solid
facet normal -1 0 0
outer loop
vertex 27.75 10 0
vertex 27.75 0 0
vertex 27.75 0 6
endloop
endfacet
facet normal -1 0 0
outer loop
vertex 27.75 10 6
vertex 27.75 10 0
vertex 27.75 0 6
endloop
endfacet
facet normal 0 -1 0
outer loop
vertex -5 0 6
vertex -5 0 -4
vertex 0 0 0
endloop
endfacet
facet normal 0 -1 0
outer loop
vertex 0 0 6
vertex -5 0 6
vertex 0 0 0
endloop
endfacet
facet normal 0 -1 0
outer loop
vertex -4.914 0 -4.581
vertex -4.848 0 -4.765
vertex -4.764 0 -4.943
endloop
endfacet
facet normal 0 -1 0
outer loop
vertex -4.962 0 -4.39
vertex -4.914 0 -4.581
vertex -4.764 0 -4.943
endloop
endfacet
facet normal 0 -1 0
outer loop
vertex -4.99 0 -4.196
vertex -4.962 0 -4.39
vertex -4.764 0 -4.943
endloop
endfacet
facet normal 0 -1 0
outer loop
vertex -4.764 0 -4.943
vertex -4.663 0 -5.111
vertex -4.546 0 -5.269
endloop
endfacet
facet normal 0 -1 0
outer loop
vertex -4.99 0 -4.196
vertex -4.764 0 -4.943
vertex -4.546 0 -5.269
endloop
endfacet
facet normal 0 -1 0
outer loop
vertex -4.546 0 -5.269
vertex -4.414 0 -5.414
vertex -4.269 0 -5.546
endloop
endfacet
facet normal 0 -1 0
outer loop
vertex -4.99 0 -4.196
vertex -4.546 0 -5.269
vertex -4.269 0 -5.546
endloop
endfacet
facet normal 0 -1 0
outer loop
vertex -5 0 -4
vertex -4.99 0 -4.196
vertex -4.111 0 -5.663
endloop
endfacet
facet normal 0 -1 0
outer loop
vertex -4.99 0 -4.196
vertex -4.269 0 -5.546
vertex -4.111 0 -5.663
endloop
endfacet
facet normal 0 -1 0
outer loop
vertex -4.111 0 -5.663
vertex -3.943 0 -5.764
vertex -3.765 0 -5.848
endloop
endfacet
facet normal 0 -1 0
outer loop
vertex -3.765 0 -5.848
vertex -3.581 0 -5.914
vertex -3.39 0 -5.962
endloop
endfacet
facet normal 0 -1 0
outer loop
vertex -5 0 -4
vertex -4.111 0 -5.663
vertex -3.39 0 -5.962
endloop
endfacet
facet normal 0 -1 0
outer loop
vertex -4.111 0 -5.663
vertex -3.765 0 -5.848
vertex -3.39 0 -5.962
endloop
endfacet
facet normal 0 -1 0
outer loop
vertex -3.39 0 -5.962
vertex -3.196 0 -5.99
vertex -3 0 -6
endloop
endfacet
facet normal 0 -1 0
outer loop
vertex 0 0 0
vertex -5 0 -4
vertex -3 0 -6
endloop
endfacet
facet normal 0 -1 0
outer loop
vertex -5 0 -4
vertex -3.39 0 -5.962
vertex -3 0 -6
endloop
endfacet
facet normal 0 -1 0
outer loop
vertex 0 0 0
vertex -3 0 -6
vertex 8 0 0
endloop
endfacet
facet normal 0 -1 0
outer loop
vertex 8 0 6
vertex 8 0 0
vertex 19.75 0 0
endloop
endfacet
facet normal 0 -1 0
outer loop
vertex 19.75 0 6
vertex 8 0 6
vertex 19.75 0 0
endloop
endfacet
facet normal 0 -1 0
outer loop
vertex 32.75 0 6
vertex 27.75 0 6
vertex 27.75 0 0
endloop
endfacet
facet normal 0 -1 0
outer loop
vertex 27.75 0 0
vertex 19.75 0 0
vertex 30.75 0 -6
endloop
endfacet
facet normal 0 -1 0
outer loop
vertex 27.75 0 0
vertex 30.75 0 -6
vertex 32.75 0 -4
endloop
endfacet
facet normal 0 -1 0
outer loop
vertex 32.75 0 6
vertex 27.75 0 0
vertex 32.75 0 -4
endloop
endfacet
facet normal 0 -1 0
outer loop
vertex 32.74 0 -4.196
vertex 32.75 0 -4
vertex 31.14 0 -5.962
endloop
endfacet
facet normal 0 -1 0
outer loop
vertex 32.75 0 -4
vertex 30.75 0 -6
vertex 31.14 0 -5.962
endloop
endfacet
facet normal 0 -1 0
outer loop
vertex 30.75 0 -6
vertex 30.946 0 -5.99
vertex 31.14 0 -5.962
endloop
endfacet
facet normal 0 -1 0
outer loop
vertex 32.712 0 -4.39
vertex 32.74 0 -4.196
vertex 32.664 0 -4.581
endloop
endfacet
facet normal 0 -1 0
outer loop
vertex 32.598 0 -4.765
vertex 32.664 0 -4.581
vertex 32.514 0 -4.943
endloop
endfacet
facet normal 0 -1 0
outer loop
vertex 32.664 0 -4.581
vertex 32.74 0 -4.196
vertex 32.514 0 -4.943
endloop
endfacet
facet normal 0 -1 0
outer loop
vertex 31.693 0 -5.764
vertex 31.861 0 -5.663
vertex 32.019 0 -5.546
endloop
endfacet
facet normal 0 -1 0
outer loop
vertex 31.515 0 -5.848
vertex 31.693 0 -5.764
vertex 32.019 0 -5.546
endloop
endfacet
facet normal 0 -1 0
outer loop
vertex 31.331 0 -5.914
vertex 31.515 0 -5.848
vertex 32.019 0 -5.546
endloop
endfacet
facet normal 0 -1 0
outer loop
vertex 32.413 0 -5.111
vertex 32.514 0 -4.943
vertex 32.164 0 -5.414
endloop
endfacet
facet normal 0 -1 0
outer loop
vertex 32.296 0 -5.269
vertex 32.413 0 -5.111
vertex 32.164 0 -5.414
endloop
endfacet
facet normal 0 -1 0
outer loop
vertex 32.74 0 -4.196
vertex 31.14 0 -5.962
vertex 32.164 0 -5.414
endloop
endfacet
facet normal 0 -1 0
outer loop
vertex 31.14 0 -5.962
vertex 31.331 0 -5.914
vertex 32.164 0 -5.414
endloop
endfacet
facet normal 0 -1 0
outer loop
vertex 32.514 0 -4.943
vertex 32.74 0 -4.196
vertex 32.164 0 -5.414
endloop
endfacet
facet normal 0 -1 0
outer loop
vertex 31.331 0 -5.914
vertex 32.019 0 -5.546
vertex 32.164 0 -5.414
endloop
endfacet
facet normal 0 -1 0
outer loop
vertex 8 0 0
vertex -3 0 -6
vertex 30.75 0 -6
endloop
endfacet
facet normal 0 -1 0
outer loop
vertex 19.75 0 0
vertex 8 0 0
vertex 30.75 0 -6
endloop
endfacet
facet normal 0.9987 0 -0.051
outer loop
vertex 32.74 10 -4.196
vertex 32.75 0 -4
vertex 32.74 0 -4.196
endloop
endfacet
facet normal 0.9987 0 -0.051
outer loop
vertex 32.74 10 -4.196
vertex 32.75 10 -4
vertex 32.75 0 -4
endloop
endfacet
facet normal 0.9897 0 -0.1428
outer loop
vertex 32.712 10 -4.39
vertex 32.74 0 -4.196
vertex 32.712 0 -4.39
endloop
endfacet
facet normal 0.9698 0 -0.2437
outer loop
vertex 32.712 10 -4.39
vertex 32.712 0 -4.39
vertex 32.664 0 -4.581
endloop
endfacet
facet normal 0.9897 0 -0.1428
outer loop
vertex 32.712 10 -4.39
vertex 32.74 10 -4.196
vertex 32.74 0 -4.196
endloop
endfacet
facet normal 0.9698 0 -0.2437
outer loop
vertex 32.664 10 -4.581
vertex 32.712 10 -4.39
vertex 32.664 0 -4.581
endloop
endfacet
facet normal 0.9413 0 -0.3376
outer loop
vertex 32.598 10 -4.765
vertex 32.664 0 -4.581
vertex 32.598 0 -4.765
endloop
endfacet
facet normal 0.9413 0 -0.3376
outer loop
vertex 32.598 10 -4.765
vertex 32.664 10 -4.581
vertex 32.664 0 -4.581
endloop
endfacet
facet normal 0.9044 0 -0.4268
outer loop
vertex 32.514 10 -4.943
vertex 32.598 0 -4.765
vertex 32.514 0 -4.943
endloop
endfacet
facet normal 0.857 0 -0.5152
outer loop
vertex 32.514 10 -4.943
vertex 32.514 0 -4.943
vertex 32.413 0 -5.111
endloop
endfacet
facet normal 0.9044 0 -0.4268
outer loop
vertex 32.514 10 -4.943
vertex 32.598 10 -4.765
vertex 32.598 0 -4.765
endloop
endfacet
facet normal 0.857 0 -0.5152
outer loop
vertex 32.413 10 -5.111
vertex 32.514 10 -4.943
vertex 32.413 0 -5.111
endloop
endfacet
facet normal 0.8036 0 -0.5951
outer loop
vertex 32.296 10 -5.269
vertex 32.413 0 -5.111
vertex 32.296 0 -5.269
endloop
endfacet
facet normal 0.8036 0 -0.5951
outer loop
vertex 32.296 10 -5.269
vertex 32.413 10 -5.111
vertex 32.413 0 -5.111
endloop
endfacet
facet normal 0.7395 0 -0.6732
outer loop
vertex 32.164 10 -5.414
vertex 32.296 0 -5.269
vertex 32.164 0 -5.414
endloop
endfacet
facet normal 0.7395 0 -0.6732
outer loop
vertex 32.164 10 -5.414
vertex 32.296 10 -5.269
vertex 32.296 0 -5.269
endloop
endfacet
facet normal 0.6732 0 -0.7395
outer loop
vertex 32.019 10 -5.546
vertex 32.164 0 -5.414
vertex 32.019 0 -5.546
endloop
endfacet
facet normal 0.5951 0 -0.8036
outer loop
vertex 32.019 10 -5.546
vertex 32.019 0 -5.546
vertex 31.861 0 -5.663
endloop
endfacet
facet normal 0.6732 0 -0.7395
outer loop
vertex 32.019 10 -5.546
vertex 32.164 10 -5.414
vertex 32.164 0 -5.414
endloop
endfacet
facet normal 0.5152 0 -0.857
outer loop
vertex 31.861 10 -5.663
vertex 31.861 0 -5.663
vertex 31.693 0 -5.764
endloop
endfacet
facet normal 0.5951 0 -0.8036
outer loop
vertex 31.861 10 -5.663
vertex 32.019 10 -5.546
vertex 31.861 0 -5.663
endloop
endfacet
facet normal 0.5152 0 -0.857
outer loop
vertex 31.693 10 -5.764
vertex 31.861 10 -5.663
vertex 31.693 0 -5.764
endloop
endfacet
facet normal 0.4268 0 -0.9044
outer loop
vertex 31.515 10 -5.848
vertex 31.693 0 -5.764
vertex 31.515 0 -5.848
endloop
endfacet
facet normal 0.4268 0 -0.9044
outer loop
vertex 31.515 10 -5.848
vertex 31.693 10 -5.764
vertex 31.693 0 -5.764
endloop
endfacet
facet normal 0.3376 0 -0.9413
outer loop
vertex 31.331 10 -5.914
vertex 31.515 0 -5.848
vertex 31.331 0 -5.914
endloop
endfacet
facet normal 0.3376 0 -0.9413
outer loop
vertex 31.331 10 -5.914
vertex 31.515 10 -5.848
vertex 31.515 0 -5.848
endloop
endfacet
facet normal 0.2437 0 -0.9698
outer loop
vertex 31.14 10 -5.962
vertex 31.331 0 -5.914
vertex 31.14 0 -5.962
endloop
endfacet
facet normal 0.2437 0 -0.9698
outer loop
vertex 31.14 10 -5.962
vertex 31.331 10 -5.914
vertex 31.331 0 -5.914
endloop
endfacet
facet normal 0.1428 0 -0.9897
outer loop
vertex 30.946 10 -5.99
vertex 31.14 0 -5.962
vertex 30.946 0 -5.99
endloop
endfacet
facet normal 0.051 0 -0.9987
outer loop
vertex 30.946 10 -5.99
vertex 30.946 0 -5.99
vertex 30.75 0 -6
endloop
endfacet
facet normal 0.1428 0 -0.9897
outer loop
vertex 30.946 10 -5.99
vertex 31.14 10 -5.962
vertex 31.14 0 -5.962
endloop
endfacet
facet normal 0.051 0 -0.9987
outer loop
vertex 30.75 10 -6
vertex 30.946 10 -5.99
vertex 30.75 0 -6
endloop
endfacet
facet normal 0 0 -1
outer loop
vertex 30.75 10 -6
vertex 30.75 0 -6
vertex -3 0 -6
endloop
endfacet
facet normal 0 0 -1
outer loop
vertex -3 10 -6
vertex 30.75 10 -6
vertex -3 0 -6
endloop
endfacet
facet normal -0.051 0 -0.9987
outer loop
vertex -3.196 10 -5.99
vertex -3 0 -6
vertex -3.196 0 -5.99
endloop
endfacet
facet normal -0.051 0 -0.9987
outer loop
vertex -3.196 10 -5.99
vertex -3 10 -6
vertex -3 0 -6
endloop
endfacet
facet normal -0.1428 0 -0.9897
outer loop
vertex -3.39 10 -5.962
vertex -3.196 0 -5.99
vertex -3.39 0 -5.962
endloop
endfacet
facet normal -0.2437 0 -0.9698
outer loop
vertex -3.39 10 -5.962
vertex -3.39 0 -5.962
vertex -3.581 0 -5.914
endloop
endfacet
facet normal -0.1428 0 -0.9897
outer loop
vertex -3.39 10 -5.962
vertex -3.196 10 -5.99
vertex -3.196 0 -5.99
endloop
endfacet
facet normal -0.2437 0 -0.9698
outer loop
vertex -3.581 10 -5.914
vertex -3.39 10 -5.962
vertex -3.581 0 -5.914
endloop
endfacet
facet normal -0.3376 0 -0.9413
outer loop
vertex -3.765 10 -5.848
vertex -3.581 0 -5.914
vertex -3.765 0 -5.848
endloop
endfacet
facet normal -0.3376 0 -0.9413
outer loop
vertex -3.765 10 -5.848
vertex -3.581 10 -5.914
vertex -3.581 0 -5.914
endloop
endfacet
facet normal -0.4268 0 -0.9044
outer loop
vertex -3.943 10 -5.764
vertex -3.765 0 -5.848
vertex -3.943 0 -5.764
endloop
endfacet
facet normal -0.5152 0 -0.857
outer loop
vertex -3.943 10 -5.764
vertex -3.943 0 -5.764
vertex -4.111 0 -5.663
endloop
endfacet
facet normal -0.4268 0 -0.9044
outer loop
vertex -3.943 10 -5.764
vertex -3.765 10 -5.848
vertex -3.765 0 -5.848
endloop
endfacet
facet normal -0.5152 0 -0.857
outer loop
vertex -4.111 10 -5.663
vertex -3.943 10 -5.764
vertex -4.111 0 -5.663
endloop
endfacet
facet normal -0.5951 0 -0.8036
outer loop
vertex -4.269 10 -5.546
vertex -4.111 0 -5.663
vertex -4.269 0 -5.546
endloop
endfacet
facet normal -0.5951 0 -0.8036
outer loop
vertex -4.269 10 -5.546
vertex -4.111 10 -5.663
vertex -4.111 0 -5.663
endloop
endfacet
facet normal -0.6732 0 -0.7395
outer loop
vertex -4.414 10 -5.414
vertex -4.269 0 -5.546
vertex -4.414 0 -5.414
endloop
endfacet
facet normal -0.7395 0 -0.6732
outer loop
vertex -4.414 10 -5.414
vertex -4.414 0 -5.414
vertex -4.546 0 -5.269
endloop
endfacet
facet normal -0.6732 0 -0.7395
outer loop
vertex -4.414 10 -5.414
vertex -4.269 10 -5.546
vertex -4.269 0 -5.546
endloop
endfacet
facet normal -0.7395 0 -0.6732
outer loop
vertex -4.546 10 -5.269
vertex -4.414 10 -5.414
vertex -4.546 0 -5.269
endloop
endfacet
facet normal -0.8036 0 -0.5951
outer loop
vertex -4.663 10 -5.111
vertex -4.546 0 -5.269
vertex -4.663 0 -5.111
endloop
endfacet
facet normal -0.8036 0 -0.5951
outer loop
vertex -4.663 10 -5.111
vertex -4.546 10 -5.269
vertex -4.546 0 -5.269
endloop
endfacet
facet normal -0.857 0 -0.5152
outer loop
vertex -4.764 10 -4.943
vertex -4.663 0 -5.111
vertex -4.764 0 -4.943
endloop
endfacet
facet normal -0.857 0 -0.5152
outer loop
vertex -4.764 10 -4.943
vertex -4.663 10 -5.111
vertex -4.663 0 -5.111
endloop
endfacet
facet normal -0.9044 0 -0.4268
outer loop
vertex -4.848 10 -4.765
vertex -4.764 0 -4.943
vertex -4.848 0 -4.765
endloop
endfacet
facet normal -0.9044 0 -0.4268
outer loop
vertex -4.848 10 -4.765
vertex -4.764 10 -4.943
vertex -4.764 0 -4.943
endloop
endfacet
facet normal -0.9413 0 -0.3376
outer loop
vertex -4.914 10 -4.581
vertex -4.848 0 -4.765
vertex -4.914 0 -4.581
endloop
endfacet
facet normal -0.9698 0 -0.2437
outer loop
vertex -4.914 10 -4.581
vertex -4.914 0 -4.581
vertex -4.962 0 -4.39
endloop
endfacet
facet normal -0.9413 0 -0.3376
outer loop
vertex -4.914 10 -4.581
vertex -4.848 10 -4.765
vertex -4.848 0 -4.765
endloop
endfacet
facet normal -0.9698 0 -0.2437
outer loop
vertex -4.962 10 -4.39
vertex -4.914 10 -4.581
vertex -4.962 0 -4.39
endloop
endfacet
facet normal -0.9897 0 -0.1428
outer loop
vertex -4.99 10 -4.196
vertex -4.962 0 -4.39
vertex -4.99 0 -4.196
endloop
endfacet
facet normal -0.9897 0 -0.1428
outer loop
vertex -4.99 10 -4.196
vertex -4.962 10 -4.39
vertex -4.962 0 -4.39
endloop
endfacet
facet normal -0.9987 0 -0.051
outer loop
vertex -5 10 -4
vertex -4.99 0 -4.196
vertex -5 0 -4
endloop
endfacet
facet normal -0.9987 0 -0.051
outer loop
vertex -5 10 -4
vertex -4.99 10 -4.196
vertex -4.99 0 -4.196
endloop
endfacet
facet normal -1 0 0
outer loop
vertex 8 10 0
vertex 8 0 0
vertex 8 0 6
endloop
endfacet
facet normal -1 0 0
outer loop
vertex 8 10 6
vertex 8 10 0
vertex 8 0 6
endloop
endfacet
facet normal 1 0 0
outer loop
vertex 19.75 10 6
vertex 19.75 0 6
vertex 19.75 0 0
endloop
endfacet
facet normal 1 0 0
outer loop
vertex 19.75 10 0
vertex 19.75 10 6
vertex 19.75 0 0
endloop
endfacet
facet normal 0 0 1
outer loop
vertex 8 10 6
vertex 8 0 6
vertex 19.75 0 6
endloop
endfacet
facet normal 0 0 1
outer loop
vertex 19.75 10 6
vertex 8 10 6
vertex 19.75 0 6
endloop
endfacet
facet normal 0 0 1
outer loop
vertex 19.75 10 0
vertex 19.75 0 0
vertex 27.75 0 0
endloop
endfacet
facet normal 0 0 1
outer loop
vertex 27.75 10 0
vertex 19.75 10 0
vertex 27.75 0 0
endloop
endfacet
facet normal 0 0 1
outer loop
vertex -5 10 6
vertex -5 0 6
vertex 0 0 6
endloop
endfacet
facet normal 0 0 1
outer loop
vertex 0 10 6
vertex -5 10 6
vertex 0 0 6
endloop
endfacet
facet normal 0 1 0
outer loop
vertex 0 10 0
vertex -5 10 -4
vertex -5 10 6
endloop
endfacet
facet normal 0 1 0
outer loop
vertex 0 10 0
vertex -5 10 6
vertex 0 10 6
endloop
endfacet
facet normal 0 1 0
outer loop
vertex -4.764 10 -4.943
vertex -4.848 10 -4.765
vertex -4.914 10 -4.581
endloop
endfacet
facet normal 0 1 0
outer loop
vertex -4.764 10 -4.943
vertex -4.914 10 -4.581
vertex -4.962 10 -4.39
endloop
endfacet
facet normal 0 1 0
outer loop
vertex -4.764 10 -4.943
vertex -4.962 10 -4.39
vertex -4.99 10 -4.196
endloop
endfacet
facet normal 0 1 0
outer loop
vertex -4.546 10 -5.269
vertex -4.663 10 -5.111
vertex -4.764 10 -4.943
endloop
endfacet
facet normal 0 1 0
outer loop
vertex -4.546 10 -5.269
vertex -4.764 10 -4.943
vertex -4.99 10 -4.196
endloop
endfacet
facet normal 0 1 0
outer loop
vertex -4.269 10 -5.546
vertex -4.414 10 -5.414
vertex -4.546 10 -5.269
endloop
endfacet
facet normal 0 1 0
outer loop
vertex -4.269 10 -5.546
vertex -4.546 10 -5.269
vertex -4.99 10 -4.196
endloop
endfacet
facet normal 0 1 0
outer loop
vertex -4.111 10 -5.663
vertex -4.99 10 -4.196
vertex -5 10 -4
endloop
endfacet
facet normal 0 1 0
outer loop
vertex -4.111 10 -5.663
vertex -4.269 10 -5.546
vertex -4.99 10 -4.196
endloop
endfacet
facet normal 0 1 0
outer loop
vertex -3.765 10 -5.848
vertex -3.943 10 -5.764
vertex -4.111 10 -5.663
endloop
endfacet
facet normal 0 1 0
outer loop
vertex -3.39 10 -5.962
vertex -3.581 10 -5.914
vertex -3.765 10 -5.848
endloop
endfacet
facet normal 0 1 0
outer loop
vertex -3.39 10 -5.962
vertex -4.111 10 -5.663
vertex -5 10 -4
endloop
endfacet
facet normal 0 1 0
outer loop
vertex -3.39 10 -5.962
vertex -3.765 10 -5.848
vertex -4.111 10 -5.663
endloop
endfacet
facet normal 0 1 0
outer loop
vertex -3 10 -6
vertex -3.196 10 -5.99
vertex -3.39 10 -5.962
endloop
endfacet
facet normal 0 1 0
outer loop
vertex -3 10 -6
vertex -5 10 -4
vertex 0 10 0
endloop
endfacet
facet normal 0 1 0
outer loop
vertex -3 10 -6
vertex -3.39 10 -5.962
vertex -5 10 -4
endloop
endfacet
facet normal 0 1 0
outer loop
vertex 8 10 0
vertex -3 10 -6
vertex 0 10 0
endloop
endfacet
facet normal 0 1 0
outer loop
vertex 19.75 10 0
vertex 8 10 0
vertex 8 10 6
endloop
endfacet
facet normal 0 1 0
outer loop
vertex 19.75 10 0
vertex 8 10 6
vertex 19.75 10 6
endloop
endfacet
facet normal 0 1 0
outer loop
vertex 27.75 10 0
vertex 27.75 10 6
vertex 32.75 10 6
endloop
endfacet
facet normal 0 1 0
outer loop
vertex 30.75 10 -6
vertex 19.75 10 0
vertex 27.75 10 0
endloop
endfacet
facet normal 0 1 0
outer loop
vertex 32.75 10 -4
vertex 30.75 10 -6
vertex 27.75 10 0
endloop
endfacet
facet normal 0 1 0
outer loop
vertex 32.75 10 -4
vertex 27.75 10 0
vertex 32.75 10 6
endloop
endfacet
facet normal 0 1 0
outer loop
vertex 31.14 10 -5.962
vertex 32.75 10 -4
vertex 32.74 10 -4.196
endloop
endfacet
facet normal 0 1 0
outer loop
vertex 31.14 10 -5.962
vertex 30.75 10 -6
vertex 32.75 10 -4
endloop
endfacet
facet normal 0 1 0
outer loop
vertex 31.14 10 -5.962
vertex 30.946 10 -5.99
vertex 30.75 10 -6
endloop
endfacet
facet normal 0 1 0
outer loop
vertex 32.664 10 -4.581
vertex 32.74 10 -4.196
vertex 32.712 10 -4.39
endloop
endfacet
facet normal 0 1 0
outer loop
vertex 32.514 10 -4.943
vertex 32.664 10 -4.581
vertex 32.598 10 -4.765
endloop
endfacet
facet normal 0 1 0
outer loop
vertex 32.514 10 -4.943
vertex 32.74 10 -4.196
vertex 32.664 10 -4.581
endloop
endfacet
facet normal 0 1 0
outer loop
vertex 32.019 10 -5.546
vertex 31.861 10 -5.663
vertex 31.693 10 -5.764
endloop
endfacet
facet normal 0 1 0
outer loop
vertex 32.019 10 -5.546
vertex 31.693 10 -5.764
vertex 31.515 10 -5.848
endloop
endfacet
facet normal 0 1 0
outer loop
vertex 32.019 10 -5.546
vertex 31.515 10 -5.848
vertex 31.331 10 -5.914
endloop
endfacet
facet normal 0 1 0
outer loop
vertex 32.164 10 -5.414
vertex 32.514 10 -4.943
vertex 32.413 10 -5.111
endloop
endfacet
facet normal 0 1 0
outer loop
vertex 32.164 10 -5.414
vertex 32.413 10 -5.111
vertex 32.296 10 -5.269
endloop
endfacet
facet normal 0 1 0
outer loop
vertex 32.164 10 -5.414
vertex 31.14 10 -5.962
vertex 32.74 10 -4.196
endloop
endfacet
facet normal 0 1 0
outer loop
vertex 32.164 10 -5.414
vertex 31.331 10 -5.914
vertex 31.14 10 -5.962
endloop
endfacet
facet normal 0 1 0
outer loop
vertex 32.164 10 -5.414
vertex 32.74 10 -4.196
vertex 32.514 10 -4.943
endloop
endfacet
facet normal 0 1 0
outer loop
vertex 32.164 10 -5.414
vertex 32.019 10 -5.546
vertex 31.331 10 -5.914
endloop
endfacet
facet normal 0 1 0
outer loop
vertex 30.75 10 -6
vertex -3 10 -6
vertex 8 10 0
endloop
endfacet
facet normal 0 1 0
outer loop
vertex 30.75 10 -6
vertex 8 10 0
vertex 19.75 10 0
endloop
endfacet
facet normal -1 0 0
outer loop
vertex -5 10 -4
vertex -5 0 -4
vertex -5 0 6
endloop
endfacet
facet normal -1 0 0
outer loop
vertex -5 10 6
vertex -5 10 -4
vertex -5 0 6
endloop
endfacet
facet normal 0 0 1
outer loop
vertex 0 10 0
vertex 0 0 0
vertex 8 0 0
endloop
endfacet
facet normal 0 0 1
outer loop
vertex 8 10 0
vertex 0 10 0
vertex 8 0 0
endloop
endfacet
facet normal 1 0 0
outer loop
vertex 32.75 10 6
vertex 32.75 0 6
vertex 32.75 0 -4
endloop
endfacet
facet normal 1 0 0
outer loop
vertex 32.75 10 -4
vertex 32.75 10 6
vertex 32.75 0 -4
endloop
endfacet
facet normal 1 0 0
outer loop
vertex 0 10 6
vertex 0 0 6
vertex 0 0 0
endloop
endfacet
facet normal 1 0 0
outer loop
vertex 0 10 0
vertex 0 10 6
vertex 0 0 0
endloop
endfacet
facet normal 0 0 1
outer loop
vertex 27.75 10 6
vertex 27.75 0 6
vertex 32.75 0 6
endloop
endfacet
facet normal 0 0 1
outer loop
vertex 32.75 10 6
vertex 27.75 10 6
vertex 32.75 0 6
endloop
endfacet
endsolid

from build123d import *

# Parameters (mm, degrees)
BOSS_EXTRUDE1_DEPTH = 10
FILLET1_R           = 2


with BuildPart() as part:
    # Sketch1 → Boss-Extrude1 (new body)
    with BuildSketch(Plane(origin=(0, 0, 0), x_dir=(1, 0, 0), z_dir=(0, 1, 0))):
        Polygon((0, 0), (8, 0), (8, -6), (19.75, -6), (19.75, 0), (27.75, 0), (27.75, -6), (32.75, -6), (32.75, 6), (-5, 6), (-5, -6), (0, -6), align=None)
    extrude(amount=BOSS_EXTRUDE1_DEPTH)

    # Fillet1
    fillet1_edges = [part.edges().sort_by_distance(p)[0] for p in [
        (-5, 5, -6),
        (32.75, 5, -6),
    ]]
    fillet(fillet1_edges, radius=FILLET1_R)


solid = part.part
